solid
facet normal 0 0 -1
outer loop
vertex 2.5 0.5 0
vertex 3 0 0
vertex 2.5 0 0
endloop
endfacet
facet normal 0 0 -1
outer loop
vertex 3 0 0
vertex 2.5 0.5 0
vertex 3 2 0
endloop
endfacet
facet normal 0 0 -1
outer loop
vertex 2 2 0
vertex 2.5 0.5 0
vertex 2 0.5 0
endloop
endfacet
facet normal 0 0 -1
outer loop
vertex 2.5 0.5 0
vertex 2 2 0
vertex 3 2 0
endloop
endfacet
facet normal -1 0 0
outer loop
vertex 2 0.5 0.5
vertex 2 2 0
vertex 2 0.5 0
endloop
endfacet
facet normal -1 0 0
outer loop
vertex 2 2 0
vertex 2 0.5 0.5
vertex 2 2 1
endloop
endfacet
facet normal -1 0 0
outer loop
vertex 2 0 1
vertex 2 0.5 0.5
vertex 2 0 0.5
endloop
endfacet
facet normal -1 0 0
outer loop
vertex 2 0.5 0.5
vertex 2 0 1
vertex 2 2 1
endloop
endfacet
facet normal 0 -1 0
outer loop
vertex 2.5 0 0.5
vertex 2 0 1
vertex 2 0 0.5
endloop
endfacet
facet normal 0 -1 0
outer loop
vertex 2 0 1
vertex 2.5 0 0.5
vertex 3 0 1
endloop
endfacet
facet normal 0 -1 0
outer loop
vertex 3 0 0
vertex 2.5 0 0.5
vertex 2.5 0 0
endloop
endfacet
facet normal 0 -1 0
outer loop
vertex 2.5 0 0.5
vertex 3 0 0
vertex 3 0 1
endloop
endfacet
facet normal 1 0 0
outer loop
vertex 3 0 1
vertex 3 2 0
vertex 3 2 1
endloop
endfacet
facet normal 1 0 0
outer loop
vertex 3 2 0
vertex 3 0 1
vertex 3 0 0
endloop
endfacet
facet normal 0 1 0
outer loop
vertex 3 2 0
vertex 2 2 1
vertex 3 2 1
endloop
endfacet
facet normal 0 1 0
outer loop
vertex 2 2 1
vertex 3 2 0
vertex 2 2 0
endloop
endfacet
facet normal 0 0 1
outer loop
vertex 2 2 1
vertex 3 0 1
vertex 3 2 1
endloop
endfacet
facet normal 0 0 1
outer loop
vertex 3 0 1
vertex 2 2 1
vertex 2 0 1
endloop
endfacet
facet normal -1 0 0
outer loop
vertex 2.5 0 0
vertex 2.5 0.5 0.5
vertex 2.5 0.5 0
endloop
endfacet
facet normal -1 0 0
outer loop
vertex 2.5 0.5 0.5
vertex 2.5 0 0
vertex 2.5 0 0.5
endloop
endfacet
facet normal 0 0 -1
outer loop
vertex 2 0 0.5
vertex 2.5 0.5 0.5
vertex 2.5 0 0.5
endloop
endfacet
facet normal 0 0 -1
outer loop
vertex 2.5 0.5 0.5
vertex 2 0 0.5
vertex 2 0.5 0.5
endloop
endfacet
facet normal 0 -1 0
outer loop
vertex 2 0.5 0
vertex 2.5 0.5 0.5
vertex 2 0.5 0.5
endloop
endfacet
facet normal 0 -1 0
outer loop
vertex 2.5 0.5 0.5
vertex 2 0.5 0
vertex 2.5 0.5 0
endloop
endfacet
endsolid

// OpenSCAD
//wird polyhedron bug?
//I think a warning would be good telling me I didn't use all points on connecting faces
//in first polyhedron


difference()
{

//create a cube using polyhedron with 6 points for bottom and only 4 points for top
//this causes buggy behaviour. rendering with an intersecting object causes polyhedron to 
//dissapear. 
//Rendered here with cube cutout shows hollow shell 
polyhedron(

points=[[0,0,0],[1,0,0],[0,1,0],[1,1,0],[0,2,0],[1,2,0],[0,0,1],[1,0,1],[0,2,1],[1,2,1]],
triangles=[[0,1,2],[1,3,2],[2,3,4],[3,5,4,],[4,5,8],[5,9,8],[8,9,7],[8,7,6],[6,7,0],[0,7,1],
				[0,8,6],[0,4,8], //lhs made using only 4 points located on face
				[1,7,9],[1,9,5]]); //rhs made using only 4 points located on face

//difference a cube
cube(1,true);
}



//fixed example using all points for sides
translate([2,0,0])
{

	difference()
	{
	polyhedron(

	points=[[0,0,0],[1,0,0],[0,1,0],[1,1,0],[0,2,0],[1,2,0],[0,0,1],[1,0,1],[0,2,1],[1,2,1]],
	triangles=[[0,1,2],[1,3,2],[2,3,4],[3,5,4,],[4,5,8],[5,9,8],[8,9,7],[8,7,6],[6,7,0],[0,7,1],
				[0,2,6],[2,8,6],[2,4,8], //lhs made with all 5 points located on face 
				[1,7,3],[3,7,9],[3,9,5]]); //rhs made with all 5 point located on face

	cube(1,true);
	}
}
